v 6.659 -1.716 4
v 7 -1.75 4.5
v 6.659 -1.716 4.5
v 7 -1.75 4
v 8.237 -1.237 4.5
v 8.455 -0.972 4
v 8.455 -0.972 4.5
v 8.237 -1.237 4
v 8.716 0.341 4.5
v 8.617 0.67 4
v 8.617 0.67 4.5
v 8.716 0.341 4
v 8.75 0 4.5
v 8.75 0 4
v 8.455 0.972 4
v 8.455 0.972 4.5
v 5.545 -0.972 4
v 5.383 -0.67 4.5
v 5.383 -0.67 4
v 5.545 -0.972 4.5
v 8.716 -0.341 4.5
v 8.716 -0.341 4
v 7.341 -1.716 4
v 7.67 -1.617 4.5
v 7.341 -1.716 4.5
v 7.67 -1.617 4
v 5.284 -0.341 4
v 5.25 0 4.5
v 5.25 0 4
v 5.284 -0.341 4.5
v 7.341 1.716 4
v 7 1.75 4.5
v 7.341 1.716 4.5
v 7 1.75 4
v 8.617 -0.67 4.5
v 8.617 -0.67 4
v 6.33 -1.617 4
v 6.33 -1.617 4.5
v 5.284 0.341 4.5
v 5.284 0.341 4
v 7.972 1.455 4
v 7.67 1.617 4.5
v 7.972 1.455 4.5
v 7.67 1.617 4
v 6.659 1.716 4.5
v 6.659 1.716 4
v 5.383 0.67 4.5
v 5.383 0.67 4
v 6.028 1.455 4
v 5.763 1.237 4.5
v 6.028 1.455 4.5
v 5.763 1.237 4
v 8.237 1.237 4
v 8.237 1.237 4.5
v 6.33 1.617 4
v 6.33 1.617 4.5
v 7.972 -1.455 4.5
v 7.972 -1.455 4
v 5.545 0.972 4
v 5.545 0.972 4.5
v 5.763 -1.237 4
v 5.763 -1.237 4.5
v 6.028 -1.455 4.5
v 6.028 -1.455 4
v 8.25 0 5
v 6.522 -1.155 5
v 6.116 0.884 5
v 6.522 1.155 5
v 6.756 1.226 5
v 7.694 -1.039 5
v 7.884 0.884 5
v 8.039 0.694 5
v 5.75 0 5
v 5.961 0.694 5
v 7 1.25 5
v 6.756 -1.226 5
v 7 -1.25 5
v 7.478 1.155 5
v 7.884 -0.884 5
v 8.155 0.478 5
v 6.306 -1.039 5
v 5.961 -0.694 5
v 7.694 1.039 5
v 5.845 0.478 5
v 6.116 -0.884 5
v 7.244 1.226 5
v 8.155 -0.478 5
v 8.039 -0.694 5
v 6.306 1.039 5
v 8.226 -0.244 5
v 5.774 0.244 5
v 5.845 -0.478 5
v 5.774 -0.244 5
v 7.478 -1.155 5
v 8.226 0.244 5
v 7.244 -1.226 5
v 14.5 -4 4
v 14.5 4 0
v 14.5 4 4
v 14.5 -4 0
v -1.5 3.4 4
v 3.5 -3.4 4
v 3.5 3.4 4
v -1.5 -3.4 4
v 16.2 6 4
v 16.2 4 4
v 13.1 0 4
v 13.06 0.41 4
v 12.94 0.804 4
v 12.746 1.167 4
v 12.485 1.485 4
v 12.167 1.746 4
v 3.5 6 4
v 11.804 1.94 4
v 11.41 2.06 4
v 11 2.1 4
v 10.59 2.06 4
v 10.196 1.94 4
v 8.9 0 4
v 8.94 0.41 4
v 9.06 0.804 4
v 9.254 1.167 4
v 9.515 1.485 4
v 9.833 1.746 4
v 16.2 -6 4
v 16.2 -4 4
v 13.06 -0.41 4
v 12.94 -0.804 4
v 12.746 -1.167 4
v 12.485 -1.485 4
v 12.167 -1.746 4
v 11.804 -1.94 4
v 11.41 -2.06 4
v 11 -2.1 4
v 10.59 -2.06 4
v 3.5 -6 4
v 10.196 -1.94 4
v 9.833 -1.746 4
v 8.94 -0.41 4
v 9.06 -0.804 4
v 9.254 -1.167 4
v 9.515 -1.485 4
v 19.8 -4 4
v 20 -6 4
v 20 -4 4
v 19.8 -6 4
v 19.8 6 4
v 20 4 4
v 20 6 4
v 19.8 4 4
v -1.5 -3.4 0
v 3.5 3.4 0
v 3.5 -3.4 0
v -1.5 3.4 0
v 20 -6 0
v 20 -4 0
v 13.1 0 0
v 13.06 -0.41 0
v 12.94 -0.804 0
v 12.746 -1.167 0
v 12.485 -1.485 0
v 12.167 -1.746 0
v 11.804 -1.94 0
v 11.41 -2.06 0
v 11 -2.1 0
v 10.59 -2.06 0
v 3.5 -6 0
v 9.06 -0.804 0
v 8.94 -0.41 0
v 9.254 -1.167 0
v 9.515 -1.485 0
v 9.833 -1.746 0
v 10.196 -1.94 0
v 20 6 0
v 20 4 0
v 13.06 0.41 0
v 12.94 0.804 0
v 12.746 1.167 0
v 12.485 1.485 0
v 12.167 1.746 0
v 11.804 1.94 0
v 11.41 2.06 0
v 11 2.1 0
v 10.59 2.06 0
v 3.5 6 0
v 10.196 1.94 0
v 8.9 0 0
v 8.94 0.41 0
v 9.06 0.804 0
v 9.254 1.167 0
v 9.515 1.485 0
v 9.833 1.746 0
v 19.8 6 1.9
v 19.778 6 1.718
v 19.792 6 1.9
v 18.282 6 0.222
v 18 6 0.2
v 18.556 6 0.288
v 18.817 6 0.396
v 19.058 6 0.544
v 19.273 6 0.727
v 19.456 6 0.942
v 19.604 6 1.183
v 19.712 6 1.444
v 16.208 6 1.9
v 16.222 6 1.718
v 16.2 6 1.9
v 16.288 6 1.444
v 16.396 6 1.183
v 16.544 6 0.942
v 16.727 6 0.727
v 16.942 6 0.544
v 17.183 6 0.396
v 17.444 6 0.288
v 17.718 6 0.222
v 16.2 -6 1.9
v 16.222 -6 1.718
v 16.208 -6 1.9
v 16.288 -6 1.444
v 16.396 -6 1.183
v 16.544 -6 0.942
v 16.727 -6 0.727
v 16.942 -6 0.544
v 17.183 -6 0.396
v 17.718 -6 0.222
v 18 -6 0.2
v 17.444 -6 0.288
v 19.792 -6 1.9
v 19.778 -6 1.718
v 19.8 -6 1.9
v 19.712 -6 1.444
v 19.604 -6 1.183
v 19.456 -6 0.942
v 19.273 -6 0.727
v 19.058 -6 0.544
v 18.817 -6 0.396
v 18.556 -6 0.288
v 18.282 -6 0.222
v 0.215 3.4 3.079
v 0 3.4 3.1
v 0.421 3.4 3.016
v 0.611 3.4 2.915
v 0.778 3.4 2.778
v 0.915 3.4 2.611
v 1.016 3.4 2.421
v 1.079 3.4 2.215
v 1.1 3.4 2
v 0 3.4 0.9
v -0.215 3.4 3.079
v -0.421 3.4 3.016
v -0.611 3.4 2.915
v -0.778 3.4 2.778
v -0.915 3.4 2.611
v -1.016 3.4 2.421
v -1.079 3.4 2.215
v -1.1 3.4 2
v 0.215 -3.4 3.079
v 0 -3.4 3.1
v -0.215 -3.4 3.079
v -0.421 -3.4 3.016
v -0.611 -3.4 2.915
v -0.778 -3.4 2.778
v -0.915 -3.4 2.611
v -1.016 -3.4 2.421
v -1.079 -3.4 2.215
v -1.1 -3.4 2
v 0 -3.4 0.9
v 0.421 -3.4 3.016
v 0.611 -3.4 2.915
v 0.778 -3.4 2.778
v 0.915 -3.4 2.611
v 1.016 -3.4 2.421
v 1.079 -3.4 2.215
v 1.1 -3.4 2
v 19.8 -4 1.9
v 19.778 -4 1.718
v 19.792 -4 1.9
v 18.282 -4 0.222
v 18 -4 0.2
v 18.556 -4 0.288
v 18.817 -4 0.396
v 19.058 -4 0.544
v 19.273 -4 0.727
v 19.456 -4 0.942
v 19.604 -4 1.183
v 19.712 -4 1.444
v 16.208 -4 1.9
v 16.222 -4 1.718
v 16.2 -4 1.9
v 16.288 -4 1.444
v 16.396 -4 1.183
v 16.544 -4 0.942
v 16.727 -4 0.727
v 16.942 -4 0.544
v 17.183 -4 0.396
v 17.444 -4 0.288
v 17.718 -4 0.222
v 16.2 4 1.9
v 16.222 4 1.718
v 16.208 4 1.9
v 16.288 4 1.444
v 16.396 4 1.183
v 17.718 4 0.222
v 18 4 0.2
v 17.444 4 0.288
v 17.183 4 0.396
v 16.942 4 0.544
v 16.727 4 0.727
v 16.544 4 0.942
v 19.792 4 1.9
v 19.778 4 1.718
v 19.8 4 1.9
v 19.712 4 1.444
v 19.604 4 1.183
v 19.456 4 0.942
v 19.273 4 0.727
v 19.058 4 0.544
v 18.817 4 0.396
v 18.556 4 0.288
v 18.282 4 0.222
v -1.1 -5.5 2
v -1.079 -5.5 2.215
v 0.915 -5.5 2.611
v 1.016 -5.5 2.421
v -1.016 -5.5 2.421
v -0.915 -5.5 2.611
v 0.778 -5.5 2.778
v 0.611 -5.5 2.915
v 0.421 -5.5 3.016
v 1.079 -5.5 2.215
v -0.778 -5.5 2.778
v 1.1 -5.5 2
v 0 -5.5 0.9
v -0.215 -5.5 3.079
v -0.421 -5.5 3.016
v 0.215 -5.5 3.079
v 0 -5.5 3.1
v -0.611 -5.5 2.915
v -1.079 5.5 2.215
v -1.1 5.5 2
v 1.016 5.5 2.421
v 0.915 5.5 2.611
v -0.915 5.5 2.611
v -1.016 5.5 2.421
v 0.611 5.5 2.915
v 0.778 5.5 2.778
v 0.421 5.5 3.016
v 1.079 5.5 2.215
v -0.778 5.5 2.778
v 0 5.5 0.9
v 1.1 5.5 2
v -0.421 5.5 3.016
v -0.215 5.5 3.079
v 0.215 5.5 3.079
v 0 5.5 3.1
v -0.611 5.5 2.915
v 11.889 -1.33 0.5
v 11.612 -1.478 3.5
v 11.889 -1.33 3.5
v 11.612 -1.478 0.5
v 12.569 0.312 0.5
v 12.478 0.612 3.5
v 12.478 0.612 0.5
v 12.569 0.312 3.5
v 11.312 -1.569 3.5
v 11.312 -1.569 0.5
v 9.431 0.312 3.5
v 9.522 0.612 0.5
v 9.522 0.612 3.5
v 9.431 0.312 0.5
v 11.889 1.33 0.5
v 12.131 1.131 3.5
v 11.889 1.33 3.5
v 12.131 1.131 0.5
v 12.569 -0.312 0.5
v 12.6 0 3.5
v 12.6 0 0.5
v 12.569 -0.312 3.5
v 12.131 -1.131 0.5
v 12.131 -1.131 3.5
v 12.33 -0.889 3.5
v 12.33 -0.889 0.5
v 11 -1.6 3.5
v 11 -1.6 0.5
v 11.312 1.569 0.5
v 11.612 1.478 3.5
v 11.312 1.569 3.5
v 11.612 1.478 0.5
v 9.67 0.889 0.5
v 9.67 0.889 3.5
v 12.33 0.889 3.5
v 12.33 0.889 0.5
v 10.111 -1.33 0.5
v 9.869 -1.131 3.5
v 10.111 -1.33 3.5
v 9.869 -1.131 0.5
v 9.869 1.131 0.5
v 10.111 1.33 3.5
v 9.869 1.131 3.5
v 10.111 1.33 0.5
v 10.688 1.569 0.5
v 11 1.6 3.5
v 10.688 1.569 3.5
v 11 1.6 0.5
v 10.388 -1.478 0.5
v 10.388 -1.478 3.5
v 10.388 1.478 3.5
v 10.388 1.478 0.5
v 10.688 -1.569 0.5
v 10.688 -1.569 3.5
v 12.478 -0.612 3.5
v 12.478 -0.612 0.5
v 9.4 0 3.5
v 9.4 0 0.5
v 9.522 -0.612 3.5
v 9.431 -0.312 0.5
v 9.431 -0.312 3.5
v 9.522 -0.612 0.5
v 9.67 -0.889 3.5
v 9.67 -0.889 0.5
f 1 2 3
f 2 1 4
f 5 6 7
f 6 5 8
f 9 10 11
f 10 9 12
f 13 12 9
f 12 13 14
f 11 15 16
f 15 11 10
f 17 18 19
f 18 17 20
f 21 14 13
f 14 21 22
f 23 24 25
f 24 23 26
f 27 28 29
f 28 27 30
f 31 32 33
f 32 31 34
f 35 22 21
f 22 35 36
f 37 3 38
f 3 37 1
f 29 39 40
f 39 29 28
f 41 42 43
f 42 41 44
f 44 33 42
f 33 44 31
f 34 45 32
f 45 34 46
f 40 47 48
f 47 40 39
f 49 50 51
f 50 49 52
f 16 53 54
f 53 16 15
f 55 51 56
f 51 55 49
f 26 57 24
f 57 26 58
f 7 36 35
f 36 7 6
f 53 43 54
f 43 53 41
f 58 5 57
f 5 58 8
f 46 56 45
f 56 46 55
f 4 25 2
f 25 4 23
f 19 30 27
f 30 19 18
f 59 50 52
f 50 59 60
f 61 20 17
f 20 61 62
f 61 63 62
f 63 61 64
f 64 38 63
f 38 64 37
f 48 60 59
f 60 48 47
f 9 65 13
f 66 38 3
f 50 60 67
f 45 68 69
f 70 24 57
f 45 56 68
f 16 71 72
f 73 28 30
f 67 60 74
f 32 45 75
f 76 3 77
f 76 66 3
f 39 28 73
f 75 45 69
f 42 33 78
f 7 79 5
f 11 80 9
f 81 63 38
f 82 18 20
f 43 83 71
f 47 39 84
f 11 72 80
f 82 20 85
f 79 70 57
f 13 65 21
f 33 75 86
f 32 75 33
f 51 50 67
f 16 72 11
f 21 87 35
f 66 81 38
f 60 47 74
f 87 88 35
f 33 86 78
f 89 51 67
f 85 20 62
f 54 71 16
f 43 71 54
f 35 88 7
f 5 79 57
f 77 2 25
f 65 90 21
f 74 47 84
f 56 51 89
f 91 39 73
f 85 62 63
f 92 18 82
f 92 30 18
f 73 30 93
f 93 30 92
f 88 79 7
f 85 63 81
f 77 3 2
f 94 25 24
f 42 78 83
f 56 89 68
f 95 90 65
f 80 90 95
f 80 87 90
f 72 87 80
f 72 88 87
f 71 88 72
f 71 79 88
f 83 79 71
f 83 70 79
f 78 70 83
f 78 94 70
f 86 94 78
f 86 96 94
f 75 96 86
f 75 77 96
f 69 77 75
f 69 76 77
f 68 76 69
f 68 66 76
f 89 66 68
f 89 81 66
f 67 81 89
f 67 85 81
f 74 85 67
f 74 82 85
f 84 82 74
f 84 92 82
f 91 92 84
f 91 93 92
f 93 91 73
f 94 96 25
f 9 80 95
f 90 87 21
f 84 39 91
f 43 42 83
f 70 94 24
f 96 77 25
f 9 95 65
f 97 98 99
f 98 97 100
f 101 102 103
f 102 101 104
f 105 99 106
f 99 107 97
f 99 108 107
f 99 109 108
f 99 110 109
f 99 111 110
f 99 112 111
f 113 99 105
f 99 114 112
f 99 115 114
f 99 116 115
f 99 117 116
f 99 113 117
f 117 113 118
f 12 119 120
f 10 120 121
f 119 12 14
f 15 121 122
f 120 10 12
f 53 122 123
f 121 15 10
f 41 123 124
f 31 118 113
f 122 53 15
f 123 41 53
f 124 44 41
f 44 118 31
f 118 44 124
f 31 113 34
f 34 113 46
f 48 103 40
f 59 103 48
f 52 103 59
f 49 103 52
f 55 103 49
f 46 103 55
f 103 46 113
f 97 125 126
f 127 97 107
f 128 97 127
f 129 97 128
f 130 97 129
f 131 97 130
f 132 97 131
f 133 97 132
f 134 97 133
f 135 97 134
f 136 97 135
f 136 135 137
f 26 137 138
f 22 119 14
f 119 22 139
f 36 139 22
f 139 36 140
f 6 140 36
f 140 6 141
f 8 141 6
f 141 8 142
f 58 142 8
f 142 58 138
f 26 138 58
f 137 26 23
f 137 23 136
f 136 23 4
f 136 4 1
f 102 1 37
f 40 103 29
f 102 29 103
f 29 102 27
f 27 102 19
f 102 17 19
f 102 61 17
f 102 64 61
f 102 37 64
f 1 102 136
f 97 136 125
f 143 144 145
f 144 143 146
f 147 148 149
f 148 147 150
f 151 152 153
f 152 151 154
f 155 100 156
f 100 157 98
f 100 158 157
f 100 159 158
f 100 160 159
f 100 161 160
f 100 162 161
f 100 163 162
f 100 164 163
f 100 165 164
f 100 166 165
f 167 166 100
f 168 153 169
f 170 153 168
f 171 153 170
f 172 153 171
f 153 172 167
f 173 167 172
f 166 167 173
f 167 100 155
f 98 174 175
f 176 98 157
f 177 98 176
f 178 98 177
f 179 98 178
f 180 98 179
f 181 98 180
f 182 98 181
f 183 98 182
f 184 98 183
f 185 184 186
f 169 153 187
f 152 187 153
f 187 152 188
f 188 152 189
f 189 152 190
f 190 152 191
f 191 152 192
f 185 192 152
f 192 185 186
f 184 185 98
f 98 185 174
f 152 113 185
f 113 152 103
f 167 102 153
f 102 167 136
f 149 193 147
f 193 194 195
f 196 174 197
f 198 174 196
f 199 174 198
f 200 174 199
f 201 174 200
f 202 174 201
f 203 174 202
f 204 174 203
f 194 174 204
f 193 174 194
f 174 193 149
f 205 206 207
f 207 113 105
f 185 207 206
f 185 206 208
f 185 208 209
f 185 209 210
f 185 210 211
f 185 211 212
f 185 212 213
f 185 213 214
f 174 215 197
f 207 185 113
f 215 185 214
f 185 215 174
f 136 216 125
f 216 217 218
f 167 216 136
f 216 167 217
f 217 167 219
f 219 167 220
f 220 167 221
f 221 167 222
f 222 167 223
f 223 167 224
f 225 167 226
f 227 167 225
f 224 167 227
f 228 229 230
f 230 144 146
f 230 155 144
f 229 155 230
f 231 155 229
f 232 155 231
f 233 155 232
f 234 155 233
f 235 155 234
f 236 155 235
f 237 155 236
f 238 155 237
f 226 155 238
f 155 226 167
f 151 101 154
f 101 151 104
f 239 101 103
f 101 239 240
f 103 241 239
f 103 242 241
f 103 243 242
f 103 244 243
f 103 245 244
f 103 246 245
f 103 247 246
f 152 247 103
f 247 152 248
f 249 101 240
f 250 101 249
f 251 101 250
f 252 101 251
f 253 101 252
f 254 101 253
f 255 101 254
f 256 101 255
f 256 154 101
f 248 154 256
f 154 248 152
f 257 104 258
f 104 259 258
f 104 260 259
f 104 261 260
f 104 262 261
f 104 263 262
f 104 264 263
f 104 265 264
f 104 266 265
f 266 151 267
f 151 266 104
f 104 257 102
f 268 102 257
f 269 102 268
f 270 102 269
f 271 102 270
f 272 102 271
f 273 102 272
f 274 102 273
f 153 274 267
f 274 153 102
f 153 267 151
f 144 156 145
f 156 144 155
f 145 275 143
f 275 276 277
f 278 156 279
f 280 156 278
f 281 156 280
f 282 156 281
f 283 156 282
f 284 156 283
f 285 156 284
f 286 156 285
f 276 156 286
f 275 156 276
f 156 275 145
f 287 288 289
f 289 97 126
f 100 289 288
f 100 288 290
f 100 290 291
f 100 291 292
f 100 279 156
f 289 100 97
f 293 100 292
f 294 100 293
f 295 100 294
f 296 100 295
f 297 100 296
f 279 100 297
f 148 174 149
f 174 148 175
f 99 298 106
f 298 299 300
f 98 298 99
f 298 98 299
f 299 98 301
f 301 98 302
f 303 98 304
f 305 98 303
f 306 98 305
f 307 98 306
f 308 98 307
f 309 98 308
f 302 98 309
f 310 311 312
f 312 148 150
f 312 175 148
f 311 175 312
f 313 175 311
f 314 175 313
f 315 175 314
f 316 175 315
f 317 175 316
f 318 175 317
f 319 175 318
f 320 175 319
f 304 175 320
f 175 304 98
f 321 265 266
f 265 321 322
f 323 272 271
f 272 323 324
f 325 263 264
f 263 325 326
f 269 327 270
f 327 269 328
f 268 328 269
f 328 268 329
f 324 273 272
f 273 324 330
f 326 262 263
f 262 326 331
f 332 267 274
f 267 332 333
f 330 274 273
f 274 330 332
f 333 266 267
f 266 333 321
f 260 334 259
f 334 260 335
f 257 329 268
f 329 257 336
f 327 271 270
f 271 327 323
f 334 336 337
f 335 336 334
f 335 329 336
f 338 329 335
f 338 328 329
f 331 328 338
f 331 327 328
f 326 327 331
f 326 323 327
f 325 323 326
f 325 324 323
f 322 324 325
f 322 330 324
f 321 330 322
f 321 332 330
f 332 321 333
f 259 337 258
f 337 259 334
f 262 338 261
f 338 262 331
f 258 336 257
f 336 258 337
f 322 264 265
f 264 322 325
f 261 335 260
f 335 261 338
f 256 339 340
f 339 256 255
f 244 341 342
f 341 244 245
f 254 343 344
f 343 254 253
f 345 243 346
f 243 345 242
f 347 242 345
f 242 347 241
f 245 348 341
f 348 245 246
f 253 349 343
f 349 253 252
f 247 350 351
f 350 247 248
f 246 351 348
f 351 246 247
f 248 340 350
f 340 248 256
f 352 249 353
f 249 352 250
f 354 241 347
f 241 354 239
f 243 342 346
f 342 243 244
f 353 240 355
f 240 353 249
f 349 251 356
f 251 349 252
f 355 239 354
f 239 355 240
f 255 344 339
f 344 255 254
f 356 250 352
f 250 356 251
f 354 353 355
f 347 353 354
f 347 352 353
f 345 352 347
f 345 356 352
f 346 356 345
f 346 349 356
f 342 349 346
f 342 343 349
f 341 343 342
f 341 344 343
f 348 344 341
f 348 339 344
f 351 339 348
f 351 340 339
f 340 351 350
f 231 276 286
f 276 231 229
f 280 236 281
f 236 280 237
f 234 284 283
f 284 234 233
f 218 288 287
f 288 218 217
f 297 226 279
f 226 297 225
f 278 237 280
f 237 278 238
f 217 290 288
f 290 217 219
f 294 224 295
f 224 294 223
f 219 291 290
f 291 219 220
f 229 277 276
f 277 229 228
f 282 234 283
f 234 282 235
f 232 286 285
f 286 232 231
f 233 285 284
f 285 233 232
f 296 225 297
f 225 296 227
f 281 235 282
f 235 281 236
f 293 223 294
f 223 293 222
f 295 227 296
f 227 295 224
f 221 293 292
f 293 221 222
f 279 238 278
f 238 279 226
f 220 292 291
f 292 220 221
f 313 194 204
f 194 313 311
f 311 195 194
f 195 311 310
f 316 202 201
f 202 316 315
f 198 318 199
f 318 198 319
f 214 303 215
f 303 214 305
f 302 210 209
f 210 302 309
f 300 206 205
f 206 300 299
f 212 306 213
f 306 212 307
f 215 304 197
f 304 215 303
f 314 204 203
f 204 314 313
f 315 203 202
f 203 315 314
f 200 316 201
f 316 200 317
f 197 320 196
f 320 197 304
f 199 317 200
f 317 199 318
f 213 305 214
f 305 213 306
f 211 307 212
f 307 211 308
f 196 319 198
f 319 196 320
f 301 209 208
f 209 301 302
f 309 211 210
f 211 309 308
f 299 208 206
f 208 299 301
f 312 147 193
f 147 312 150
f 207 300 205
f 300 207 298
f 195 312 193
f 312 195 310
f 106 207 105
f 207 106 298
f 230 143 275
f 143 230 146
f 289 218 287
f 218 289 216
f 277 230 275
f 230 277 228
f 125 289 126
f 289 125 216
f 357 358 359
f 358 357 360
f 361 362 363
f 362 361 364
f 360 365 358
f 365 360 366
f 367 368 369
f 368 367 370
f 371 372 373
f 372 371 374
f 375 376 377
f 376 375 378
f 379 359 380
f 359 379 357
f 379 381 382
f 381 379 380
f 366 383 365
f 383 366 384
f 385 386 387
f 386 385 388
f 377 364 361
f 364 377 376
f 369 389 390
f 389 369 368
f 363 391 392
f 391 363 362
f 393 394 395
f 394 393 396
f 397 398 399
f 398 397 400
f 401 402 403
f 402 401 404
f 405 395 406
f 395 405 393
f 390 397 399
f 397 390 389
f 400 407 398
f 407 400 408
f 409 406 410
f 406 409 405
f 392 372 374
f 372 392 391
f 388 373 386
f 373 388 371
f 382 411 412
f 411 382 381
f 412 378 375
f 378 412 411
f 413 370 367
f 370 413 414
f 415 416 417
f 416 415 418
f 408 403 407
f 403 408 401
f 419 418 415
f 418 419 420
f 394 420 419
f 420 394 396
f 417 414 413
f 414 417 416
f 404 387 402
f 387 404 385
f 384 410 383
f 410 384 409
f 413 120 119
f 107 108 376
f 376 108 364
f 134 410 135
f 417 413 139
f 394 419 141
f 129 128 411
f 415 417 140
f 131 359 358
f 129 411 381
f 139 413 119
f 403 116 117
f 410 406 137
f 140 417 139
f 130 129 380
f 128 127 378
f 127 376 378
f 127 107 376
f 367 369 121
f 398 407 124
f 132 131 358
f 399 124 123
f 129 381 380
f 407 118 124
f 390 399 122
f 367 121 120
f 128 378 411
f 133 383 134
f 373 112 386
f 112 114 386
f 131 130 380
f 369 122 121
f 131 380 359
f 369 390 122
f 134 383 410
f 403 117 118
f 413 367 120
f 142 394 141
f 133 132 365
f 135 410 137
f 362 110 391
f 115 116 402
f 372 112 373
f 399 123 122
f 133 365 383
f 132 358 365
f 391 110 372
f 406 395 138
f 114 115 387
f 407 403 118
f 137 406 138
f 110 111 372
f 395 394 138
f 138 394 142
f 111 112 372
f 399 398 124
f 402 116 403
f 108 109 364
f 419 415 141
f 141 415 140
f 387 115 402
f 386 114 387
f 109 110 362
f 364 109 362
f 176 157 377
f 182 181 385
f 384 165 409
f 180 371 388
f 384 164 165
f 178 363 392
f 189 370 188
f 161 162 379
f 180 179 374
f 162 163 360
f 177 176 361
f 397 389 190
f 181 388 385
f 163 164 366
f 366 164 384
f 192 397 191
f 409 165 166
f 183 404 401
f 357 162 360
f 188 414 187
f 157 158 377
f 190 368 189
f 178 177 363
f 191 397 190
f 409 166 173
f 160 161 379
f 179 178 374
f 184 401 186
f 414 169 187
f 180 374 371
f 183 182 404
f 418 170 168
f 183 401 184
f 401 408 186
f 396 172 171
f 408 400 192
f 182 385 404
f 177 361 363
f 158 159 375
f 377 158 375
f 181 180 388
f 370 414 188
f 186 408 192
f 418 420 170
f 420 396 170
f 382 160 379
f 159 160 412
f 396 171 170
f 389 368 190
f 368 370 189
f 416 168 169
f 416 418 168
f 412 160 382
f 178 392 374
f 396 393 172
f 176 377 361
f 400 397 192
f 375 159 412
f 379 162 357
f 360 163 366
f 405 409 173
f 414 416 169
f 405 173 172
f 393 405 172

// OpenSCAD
// Bracelet of hinged links, printed in place (3-link sample of a 10-link chain)
part = "link"; // ["link", "assembly"]
cadverify_only = "";
module instance(name, part, unit = 1) {
    echo(cadverify_instance = [name, part, unit]);
    if (cadverify_only == "" || cadverify_only == name) children();
}
// link: pitch 18 (X), width 12 (Y), body 4 thick + 1 snap stud = 5
// hinge: teardrop pin (r1.1) in U-cradle (r1.8, open at top), 0.7 radial, 0.6 side clearance
P = 18; W = 12; Zc = 2.0;
Rp = 1.1; Rh = 1.8; SlotH = 1.8;
Ytong = 3.4;
Xrear = -1.5; Xsr = 3.5; Xsf = 14.5; Xlr = 13.5; Xfront = 20;
XpinF = 18;
studX = 7; studR = 1.75;
holeX = 11; holeR = 1.6;
module teardrop2D() {
    pts = concat([for (a=[0:180/16:180]) [Rp*cos(a), Zc+Rp*sin(a)]], [[0, Zc-Rp]]);
    polygon(pts);
}
module pin_stub(len) { linear_extrude(height=len) teardrop2D(); }
module stud_solid() {
    translate([studX, 0, 3.9]) cylinder(r=studR, h=0.6, $fn=32);
    translate([studX, 0, 4.5]) cylinder(r1=studR, r2=1.25, h=0.5, $fn=32);
}
module link() {
    difference() {
        union() {
            translate([Xsr, -6, 0]) cube([Xsf-Xsr, 12, 4]);
            translate([Xrear, -Ytong, 0]) cube([(4.5-Xrear), 2*Ytong, 4]);
            translate([Xlr, -6, 0]) cube([Xfront-Xlr, 2, 4]);
            translate([Xlr, 4, 0]) cube([Xfront-Xlr, 2, 4]);
            translate([0, -2.5, 0]) rotate([90,0,0]) pin_stub(3.0);
            translate([0, 5.5, 0]) rotate([90,0,0]) pin_stub(3.0);
            stud_solid();
        }
        translate([XpinF, -6.1, Zc]) rotate([-90,0,0]) cylinder(r=Rh, h=2.2, $fn=40);
        translate([XpinF, 3.9, Zc]) rotate([-90,0,0]) cylinder(r=Rh, h=2.2, $fn=40);
        translate([XpinF-SlotH, 3.9, 1.9]) cube([2*SlotH, 2.2, 2.2]);
        translate([XpinF-SlotH, -6.1, 1.9]) cube([2*SlotH, 2.2, 2.2]);
        translate([holeX, 0, -0.1]) cylinder(r=holeR, h=4.2, $fn=32);
        translate([holeX, 0, 3.5]) cylinder(r1=holeR, r2=2.1, h=0.5, $fn=32);
        translate([holeX, 0, 0]) cylinder(r1=2.1, r2=holeR, h=0.5, $fn=32);
    }
}
if (part == "assembly") {
    echo(cadverify_spec = [
        ["bounds", [[-1.5, -6, 0], [56, 6, 5]]],
        ["support_faces", [["bed", "-z", 300]]],
        ["allowed_interferences", []],
        ["motions", [["joint_bend", ["link3"], "rotate", [36, 0, 2], [0, 1, 0], [-30, 30]]]],
        ["assembly_order", [[["link1"], [0, 0, 0]], [["link2"], [0, 0, -1]], [["link3"], [0, 0, -1]]]],
        ["print_in_place", 0.5],
        ["overhangs_allowed", []]
    ]);
    instance("link1", "link", 1) translate([0, 0, 0]) link();
    instance("link2", "link", 1) translate([18, 0, 0]) link();
    instance("link3", "link", 1) translate([36, 0, 0]) link();
} else {
    echo(cadverify_spec = [
        ["bounds", [[-1.5, -6, 0], [20, 6, 5]]],
        ["bodies", 1],
        ["through_holes", 1],
        ["support_faces", [["bed", "-z", 100]]],
        ["overhangs_allowed", []],
        ["copies", 3],
        ["details", [
            ["spine", "material", [[5, -5, 0], [9, 5, 4]], 0.9],
            ["slot", "void", [[14.5, -4, 0], [20, 4, 4]], 0.9],
            ["cradle", "void", [[16.2, 4, 1.9], [19.8, 6.1, 4.1]], 0.9],
            ["snap_hole", "hole", [11, 0, 6], [0, 0, -1], [[0, 4.2], [0.5, 3.2], [3.5, 3.2]]],
            ["floor", "thickness", [9, 3, -1], [0, 0, 1], 4],
            ["snap", "view", [[5, -2, 4], [9, 2, 5]]]
        ]]
    ]);
    link();
}
